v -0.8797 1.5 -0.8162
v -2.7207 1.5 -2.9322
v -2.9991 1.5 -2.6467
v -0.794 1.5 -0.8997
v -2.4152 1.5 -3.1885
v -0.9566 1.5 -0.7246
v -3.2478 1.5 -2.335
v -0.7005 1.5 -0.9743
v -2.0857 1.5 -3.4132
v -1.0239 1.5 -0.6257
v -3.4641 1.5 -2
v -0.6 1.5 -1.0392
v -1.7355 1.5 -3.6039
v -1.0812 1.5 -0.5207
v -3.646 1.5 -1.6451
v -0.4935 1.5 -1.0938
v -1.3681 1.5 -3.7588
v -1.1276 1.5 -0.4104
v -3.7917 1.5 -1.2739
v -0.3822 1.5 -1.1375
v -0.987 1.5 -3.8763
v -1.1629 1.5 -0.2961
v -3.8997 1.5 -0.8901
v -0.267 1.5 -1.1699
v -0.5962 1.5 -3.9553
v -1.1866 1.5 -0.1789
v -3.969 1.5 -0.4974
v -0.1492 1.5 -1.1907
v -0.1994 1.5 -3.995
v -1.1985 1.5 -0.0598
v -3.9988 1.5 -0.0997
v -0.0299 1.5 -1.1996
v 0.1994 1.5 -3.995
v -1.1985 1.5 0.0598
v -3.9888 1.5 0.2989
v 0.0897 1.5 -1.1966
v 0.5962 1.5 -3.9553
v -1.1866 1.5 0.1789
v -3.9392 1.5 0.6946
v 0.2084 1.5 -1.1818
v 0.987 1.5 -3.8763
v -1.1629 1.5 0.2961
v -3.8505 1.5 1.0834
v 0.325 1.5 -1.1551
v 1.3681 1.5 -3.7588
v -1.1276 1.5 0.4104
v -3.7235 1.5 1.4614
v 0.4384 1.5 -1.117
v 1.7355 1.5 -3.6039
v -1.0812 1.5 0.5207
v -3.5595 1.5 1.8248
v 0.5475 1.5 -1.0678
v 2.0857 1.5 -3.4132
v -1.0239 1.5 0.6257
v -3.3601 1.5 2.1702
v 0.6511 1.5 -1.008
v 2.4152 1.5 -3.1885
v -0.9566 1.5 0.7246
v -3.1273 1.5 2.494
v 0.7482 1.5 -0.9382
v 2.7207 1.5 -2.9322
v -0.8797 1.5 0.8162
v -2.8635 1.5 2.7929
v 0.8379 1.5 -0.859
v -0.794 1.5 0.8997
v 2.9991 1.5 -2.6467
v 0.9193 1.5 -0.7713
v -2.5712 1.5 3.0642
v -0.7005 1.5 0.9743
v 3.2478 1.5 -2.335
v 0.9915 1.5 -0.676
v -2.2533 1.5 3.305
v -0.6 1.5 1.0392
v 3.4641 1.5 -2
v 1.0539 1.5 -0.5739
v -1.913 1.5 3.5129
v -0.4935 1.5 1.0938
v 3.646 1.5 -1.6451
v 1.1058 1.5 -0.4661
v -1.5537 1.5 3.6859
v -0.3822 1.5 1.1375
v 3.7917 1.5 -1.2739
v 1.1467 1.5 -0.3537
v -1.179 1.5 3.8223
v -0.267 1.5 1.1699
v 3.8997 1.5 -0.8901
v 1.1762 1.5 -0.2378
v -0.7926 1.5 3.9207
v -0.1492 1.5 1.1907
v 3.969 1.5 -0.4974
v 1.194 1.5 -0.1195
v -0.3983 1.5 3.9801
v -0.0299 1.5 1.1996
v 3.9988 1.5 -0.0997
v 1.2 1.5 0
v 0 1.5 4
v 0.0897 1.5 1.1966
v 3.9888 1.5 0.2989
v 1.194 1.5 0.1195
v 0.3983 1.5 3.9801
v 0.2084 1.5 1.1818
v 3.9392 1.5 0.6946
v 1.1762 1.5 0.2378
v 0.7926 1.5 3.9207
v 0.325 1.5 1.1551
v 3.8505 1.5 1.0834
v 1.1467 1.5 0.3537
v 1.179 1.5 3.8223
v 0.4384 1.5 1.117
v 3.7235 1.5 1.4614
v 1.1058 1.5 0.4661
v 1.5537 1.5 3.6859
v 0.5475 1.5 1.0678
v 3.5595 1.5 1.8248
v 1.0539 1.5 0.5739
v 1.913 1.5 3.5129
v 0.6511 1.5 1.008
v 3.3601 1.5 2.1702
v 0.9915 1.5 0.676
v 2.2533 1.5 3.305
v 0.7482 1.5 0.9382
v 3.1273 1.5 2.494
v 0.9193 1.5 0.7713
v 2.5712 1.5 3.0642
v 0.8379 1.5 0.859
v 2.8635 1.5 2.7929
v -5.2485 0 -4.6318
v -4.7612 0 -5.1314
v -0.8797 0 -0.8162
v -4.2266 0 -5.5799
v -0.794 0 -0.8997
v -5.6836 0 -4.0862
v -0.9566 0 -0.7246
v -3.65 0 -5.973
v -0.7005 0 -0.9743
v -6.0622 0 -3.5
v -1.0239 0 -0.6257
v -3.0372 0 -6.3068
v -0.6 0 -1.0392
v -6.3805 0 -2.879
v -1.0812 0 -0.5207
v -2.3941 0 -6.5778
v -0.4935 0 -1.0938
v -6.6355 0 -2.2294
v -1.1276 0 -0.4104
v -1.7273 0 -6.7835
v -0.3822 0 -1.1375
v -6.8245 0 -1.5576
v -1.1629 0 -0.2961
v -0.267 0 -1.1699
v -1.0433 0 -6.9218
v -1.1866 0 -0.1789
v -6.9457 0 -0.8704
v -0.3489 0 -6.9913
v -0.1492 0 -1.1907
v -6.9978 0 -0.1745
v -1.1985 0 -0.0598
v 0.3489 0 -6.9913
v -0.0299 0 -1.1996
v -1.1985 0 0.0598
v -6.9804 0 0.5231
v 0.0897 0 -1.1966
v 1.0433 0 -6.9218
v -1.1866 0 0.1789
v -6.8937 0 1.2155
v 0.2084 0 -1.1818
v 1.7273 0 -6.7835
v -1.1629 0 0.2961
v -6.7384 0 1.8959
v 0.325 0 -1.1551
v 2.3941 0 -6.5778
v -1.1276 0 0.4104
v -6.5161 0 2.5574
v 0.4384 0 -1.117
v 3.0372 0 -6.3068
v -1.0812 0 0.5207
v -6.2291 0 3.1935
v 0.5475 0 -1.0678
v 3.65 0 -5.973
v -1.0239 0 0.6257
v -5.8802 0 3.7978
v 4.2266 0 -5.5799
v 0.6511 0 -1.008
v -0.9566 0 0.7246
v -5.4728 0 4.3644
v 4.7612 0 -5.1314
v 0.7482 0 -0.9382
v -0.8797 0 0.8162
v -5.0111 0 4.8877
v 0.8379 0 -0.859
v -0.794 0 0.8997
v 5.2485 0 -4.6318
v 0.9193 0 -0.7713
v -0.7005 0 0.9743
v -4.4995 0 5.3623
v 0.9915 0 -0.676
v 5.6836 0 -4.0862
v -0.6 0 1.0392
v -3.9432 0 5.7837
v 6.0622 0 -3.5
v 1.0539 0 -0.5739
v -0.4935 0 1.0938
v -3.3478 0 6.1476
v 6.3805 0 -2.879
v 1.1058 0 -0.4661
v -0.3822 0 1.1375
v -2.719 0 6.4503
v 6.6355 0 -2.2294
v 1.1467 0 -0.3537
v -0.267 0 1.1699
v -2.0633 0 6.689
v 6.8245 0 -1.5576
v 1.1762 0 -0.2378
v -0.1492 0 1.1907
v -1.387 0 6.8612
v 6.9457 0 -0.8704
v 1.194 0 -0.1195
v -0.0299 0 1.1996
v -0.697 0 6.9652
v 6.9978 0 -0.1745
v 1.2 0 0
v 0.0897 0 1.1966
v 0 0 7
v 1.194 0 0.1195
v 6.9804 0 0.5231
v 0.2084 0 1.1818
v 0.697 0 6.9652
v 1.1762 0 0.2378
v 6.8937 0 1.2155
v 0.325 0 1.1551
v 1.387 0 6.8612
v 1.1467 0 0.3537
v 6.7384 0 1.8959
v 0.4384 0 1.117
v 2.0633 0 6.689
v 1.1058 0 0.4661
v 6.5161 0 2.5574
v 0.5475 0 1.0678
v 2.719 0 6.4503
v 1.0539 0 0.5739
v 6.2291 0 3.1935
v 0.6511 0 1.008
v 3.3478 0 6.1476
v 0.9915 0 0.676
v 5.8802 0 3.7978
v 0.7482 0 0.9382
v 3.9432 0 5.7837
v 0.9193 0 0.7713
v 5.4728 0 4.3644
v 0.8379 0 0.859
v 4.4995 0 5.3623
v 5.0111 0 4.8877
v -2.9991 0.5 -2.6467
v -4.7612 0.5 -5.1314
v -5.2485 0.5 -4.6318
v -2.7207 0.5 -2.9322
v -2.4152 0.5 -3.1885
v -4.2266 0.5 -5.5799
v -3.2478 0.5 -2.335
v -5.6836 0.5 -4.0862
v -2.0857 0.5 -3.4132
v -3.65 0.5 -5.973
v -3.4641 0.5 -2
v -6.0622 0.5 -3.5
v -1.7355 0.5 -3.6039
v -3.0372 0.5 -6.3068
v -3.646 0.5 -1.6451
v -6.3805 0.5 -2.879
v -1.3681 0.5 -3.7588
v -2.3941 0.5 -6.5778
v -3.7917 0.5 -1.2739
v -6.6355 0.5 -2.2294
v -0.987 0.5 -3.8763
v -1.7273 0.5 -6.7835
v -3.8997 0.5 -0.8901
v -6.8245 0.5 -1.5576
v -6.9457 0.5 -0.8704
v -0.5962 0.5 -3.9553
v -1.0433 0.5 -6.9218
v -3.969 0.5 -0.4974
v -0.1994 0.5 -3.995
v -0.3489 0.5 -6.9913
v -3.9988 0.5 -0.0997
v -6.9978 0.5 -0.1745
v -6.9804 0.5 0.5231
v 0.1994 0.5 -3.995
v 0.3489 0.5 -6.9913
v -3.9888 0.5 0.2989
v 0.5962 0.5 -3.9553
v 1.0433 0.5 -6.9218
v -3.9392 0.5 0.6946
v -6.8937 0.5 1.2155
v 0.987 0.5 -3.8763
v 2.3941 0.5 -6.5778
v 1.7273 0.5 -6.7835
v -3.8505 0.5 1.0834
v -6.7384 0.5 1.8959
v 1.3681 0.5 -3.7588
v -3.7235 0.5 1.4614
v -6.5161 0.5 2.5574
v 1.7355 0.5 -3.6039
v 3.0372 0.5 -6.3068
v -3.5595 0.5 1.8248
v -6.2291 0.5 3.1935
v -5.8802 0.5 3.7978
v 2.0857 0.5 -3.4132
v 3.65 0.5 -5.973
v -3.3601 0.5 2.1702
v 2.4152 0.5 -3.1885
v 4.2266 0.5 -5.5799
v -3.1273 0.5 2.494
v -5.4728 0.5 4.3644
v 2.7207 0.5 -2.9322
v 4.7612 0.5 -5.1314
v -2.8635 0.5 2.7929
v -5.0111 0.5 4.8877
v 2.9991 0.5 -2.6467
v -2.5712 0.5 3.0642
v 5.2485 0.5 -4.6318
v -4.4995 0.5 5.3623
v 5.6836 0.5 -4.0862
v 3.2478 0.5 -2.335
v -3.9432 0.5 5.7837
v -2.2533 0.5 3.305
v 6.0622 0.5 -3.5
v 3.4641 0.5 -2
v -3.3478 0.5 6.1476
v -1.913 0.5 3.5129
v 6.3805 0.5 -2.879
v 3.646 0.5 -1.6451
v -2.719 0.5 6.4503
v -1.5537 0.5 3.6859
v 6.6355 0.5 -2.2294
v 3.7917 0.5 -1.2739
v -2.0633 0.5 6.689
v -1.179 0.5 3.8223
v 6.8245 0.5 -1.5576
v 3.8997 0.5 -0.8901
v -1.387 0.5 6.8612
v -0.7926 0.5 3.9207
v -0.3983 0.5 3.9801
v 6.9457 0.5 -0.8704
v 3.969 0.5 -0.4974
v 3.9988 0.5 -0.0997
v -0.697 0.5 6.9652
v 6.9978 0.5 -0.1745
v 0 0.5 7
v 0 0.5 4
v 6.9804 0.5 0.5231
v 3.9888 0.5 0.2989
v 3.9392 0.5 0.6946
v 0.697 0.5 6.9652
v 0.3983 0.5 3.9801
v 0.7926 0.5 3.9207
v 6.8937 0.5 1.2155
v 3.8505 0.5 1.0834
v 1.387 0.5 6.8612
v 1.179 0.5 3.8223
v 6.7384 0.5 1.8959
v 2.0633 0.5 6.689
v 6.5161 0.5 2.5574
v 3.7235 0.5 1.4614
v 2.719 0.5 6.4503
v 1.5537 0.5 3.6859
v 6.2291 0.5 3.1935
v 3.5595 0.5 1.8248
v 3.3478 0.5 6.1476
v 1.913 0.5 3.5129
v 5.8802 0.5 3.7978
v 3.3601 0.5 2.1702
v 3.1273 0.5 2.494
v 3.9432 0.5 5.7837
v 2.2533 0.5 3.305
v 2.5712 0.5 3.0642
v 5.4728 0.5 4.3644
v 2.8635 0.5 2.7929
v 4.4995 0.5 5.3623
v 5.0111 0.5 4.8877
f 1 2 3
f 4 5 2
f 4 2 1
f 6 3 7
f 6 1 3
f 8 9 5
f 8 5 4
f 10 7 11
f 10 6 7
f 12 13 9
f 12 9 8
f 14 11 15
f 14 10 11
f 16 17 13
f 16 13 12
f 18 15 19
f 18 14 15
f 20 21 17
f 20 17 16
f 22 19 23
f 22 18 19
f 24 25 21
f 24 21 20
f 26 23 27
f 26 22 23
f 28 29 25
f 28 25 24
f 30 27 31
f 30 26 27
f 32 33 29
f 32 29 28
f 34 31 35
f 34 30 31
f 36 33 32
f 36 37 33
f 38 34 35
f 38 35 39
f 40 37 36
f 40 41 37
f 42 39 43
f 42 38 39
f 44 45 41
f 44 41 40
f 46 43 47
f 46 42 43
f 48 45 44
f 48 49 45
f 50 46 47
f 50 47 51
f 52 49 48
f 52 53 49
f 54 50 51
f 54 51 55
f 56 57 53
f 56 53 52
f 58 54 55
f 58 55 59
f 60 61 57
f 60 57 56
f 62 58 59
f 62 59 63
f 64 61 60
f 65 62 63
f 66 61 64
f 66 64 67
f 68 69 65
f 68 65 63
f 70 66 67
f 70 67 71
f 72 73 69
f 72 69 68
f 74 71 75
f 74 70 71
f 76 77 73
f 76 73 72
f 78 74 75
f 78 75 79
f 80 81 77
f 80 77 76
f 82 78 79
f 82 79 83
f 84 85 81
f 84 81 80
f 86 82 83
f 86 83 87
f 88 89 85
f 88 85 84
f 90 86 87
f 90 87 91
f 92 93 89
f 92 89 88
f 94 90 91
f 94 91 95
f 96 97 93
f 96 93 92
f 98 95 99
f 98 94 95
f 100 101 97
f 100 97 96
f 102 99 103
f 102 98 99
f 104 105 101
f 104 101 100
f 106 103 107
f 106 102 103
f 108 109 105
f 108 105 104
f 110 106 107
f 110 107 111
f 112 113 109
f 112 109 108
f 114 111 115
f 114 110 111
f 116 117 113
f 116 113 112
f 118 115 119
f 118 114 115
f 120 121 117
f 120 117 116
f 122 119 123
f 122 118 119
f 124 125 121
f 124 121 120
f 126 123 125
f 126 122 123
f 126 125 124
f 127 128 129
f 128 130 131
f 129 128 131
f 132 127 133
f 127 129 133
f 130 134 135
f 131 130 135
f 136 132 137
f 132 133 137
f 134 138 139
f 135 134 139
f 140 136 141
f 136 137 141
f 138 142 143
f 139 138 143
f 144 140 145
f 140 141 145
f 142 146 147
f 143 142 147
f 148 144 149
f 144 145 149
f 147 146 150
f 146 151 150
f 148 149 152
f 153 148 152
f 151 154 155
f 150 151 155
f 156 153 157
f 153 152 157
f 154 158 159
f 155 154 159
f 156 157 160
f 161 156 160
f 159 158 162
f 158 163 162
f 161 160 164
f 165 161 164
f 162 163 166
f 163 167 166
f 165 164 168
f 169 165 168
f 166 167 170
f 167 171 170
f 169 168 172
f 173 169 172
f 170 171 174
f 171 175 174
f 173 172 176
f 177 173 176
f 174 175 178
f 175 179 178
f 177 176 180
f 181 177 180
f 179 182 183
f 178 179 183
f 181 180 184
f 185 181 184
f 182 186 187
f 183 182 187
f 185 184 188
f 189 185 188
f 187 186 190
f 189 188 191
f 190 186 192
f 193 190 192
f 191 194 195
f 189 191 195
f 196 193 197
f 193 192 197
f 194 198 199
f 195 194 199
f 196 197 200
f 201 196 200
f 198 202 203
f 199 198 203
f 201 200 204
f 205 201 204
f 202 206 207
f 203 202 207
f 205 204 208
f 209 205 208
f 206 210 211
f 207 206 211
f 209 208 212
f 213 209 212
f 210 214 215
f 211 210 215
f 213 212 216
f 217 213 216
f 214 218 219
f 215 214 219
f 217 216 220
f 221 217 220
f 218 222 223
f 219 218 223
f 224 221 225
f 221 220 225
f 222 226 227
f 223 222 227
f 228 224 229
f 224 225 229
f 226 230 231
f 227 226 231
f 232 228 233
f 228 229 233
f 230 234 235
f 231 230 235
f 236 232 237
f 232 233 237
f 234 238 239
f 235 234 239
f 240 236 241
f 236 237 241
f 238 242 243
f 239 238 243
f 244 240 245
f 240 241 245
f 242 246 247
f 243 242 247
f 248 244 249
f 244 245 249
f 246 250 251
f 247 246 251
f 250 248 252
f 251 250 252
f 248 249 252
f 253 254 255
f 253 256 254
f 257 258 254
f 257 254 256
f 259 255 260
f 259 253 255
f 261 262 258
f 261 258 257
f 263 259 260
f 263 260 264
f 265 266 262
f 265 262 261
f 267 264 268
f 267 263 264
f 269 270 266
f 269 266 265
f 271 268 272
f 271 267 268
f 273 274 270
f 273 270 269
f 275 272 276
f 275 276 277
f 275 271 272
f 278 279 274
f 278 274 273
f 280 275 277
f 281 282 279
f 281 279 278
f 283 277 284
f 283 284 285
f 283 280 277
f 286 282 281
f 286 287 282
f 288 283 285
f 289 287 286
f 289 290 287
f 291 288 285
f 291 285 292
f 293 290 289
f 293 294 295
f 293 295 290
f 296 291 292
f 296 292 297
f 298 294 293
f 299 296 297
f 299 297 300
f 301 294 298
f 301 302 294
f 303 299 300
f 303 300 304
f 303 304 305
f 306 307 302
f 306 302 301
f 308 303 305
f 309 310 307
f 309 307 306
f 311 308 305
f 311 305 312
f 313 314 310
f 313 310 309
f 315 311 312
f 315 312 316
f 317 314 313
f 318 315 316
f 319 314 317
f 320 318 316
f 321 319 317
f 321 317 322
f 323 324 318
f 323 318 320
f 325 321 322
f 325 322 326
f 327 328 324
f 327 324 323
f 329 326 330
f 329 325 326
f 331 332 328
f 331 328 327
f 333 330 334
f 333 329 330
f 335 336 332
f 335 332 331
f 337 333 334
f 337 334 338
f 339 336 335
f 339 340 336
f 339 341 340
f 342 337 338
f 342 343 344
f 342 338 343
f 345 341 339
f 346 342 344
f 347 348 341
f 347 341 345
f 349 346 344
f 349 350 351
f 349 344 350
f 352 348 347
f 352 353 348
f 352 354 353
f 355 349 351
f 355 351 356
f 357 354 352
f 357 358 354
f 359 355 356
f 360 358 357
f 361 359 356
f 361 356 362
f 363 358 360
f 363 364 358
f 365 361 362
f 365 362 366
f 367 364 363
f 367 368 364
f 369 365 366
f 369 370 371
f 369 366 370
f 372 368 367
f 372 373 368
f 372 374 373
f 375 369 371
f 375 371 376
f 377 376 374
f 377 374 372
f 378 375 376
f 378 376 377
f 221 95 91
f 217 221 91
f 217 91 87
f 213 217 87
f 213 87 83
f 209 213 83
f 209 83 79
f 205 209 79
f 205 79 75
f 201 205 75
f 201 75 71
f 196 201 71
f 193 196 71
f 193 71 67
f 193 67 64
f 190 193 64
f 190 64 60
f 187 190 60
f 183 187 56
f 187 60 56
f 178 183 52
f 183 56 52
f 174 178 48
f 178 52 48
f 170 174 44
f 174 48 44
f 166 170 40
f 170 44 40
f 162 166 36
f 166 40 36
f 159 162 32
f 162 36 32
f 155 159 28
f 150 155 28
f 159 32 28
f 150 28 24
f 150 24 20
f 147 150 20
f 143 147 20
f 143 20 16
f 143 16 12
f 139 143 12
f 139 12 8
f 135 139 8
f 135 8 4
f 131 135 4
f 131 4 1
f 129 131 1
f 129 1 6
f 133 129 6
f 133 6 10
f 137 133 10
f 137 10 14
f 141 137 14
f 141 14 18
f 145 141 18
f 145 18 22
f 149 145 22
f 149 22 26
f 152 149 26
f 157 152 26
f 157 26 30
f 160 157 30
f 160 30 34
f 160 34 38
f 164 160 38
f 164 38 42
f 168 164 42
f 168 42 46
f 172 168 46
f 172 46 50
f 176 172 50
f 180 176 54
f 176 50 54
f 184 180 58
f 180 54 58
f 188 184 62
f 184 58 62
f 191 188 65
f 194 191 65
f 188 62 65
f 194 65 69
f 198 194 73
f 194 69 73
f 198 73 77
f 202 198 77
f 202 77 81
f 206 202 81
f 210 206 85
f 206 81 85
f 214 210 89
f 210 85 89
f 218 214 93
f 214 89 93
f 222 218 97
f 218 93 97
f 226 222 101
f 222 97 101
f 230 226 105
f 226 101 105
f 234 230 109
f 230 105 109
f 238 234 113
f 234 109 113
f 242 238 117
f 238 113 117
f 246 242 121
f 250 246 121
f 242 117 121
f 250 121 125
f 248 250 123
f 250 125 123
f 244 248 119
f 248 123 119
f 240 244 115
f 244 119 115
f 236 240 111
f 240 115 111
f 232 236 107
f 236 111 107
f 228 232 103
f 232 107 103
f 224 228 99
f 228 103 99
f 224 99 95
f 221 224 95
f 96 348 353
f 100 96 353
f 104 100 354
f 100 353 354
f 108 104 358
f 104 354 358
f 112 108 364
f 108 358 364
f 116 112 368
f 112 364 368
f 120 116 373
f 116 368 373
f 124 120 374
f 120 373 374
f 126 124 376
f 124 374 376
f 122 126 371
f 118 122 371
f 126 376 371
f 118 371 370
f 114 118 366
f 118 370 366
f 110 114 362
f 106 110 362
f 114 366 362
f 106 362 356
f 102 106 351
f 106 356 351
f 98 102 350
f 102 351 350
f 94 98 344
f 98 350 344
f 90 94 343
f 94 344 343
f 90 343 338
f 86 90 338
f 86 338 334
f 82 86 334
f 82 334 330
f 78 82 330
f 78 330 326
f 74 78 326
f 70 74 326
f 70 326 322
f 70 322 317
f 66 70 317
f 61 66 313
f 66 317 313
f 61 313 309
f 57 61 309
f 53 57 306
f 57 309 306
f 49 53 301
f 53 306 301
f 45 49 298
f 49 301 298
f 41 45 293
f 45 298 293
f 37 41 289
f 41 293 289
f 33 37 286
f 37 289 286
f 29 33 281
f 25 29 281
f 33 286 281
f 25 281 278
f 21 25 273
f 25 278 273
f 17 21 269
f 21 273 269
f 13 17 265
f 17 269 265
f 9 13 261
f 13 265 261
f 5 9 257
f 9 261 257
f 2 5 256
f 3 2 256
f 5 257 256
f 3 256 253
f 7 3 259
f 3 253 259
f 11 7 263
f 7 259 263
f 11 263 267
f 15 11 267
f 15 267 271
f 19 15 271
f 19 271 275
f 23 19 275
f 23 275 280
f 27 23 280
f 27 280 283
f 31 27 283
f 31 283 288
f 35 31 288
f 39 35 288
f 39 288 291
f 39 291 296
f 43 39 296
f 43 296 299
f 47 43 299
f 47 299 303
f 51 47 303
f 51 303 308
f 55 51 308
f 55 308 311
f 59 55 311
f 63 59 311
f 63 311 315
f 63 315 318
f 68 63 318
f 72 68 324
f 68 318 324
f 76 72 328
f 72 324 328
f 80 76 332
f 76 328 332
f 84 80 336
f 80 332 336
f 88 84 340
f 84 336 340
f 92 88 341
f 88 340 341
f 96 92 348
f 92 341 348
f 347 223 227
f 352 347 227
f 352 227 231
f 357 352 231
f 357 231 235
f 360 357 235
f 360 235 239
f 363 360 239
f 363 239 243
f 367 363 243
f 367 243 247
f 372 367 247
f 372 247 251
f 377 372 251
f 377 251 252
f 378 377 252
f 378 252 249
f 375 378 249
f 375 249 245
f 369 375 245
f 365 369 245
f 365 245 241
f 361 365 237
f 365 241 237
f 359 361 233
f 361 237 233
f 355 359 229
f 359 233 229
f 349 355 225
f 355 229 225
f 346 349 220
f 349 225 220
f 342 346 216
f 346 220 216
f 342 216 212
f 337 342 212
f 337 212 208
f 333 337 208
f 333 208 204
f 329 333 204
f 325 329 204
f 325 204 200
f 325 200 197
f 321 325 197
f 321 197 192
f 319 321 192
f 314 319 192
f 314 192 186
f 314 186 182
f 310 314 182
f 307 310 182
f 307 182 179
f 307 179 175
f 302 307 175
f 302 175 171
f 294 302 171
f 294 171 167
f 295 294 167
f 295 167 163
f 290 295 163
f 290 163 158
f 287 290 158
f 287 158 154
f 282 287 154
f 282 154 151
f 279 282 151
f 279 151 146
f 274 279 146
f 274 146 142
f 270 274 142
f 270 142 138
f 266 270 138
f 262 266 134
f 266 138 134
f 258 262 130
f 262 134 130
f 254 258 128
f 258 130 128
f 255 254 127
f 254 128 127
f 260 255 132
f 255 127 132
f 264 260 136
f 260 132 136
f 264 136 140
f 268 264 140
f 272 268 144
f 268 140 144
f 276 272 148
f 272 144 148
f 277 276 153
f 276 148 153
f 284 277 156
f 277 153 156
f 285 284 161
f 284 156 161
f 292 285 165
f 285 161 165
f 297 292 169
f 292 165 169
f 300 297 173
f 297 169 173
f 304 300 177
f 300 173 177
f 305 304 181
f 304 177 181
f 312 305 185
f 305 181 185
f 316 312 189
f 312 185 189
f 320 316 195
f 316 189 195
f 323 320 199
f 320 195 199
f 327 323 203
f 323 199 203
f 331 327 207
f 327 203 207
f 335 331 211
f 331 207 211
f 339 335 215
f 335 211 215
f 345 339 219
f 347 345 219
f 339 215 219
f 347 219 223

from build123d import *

# Parameters (mm, degrees)
SKETCH1_R                = 7
BOSS_EXTRUDE1_DEPTH      = 1.5
CUT_EXTRUDE1_START       = -1
SKETCH2_R                = 7
SKETCH2_R_2              = 4
CUT_EXTRUDE1_DEPTH       = 1
M2_CLEARANCE_HOLE1_D     = 2.4
M2_CLEARANCE_HOLE1_DEPTH = 3
M2_CLEARANCE_HOLE1_TIP   = 0.721032743


with BuildPart() as part:
    # Sketch1 → Boss-Extrude1 (new body)
    with BuildSketch(Plane(origin=(0, 0, 0), x_dir=(1, 0, 0), z_dir=(0, 1, 0))):
        with Locations(Location((0, 0, 0), (0, 0, 270))):
            Circle(SKETCH1_R)
    extrude(amount=BOSS_EXTRUDE1_DEPTH)

    # Sketch2 → Cut-Extrude1 (cut)
    with BuildSketch(Plane(origin=(0, 1.5, 0), x_dir=(1, 0, 0), z_dir=(0, 1, 0)).offset(CUT_EXTRUDE1_START)):
        with Locations(Location((0, 0, 0), (0, 0, 270))):
            Circle(SKETCH2_R)
        with Locations(Location((0, 0, 0), (0, 0, 270))):
            Circle(SKETCH2_R_2, mode=Mode.SUBTRACT)
    extrude(amount=CUT_EXTRUDE1_DEPTH, mode=Mode.SUBTRACT)

    # M2 Clearance Hole1
    with Locations(Plane(origin=(0, 0, 0), x_dir=(-1, 0, 0), z_dir=(0, -1, 0))):
        with Locations((0, 0)):
            Hole(M2_CLEARANCE_HOLE1_D / 2, depth=M2_CLEARANCE_HOLE1_DEPTH)
            with Locations((0, 0, -(M2_CLEARANCE_HOLE1_DEPTH + M2_CLEARANCE_HOLE1_TIP / 2))):  # 118° drill point
                Cone(0, M2_CLEARANCE_HOLE1_D / 2, M2_CLEARANCE_HOLE1_TIP, mode=Mode.SUBTRACT)


solid = part.part
